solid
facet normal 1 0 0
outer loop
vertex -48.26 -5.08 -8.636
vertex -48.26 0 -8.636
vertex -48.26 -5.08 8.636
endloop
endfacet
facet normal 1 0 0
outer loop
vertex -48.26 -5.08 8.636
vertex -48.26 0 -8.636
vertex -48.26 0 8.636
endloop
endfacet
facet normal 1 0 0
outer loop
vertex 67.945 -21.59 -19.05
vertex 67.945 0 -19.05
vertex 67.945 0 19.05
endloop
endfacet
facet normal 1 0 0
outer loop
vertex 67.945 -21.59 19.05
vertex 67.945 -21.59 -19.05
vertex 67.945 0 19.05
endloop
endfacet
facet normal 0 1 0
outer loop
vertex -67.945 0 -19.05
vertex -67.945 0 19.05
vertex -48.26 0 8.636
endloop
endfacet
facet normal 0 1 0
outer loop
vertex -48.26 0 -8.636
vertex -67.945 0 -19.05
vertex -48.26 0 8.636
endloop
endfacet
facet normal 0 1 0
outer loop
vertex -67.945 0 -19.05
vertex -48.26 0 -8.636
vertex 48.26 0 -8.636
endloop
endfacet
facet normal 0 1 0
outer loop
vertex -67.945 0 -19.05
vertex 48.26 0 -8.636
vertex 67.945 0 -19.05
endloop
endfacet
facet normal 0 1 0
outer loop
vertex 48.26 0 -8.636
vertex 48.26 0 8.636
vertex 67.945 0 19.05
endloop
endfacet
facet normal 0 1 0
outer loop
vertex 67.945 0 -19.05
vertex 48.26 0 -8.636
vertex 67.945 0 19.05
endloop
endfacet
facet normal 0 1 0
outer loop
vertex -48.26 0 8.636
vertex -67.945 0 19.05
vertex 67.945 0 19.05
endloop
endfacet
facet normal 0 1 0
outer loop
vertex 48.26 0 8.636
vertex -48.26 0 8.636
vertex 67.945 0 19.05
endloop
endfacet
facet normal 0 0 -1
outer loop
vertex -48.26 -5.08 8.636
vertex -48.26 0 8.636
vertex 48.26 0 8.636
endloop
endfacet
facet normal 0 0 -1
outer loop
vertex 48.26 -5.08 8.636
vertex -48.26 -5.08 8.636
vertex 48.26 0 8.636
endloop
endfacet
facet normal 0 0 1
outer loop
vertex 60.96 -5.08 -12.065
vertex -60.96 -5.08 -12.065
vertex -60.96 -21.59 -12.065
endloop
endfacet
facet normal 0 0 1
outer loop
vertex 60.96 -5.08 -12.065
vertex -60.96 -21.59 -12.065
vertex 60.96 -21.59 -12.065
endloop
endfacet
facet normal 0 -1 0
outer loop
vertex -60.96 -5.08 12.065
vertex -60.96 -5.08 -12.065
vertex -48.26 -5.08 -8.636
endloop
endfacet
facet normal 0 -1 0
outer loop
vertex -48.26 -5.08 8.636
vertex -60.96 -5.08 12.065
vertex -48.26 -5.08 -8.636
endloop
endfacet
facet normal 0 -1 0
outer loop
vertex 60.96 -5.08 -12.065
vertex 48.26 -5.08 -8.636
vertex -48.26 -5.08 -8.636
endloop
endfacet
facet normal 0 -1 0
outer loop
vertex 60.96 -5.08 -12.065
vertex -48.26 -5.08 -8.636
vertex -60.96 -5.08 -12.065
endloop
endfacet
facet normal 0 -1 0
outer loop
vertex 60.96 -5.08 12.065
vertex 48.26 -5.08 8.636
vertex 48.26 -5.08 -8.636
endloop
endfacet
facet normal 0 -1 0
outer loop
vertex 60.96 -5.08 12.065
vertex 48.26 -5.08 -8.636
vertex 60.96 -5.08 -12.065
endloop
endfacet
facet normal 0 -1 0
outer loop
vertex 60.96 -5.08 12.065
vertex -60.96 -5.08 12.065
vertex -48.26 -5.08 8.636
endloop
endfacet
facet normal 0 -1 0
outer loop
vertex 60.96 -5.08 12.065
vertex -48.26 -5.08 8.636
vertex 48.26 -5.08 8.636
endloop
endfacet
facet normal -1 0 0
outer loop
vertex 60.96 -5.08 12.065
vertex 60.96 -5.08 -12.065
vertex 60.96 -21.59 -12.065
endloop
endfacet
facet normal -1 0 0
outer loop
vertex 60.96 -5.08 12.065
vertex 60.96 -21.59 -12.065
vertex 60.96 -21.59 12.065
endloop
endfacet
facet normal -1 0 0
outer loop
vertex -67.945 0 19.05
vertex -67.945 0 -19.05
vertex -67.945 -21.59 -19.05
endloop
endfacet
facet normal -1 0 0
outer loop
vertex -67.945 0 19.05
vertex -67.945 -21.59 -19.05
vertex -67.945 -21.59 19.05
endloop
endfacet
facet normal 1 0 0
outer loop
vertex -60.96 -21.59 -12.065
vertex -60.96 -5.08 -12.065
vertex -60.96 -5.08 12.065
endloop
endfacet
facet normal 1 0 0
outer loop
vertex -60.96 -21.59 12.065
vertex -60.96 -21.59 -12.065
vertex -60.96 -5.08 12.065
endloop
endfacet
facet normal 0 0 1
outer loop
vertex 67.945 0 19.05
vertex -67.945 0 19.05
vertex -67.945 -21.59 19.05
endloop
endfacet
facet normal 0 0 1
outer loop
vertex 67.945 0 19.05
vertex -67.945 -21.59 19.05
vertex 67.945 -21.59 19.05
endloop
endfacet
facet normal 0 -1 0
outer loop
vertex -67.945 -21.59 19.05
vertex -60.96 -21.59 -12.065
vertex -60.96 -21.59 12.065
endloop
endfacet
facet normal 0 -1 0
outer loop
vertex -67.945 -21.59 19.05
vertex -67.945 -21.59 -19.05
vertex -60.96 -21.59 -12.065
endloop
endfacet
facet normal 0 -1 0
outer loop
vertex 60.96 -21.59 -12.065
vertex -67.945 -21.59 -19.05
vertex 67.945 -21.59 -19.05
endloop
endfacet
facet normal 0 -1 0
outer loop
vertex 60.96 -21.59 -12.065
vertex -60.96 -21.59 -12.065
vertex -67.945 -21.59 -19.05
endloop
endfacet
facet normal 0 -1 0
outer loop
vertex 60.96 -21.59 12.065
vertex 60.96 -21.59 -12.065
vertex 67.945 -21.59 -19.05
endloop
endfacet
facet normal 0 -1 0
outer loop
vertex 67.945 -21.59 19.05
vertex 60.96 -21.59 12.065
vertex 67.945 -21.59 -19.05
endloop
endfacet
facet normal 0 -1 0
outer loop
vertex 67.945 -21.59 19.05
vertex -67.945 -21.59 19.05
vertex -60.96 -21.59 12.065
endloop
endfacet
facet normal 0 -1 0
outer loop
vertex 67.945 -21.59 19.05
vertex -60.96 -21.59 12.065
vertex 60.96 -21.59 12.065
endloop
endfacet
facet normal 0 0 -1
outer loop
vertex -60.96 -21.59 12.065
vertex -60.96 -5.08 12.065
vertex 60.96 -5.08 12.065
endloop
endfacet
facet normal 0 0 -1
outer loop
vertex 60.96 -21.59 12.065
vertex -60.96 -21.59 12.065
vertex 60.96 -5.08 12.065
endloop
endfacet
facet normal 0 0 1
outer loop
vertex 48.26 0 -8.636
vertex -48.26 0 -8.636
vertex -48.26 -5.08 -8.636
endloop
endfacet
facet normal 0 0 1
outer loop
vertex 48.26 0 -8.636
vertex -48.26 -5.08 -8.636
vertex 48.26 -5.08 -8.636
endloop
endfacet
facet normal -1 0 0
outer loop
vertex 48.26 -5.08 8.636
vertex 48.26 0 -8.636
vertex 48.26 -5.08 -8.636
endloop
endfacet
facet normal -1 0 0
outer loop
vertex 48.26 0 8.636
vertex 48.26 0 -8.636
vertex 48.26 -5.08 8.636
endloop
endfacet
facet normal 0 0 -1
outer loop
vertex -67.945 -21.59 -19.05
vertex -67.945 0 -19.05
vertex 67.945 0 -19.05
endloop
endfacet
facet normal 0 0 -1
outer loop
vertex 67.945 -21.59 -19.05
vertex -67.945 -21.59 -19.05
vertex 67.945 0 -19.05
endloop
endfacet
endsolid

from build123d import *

# Parameters (mm, degrees)
F0_W     = 121.92
F0_H     = 24.13
F0_W_2   = 96.52
F0_H_2   = 17.272
F1_DEPTH = 5.08
F2_W     = 135.89
F2_H     = 38.1
F2_W_2   = 121.92
F2_H_2   = 24.13
F3_DEPTH = 21.59


with BuildPart() as f1:
    # F0 (on Front) → F1 (new body)
    with BuildSketch(Plane.XZ):
        Rectangle(F0_W, F0_H)
        Rectangle(F0_W_2, F0_H_2, mode=Mode.SUBTRACT)
    extrude(amount=F1_DEPTH)

    # F2 (on Front) → F3 (join)
    with BuildSketch(Plane.XZ):
        Rectangle(F2_W, F2_H)
        Rectangle(F2_W_2, F2_H_2, mode=Mode.SUBTRACT)
    extrude(amount=F3_DEPTH)


solid = f1.part
